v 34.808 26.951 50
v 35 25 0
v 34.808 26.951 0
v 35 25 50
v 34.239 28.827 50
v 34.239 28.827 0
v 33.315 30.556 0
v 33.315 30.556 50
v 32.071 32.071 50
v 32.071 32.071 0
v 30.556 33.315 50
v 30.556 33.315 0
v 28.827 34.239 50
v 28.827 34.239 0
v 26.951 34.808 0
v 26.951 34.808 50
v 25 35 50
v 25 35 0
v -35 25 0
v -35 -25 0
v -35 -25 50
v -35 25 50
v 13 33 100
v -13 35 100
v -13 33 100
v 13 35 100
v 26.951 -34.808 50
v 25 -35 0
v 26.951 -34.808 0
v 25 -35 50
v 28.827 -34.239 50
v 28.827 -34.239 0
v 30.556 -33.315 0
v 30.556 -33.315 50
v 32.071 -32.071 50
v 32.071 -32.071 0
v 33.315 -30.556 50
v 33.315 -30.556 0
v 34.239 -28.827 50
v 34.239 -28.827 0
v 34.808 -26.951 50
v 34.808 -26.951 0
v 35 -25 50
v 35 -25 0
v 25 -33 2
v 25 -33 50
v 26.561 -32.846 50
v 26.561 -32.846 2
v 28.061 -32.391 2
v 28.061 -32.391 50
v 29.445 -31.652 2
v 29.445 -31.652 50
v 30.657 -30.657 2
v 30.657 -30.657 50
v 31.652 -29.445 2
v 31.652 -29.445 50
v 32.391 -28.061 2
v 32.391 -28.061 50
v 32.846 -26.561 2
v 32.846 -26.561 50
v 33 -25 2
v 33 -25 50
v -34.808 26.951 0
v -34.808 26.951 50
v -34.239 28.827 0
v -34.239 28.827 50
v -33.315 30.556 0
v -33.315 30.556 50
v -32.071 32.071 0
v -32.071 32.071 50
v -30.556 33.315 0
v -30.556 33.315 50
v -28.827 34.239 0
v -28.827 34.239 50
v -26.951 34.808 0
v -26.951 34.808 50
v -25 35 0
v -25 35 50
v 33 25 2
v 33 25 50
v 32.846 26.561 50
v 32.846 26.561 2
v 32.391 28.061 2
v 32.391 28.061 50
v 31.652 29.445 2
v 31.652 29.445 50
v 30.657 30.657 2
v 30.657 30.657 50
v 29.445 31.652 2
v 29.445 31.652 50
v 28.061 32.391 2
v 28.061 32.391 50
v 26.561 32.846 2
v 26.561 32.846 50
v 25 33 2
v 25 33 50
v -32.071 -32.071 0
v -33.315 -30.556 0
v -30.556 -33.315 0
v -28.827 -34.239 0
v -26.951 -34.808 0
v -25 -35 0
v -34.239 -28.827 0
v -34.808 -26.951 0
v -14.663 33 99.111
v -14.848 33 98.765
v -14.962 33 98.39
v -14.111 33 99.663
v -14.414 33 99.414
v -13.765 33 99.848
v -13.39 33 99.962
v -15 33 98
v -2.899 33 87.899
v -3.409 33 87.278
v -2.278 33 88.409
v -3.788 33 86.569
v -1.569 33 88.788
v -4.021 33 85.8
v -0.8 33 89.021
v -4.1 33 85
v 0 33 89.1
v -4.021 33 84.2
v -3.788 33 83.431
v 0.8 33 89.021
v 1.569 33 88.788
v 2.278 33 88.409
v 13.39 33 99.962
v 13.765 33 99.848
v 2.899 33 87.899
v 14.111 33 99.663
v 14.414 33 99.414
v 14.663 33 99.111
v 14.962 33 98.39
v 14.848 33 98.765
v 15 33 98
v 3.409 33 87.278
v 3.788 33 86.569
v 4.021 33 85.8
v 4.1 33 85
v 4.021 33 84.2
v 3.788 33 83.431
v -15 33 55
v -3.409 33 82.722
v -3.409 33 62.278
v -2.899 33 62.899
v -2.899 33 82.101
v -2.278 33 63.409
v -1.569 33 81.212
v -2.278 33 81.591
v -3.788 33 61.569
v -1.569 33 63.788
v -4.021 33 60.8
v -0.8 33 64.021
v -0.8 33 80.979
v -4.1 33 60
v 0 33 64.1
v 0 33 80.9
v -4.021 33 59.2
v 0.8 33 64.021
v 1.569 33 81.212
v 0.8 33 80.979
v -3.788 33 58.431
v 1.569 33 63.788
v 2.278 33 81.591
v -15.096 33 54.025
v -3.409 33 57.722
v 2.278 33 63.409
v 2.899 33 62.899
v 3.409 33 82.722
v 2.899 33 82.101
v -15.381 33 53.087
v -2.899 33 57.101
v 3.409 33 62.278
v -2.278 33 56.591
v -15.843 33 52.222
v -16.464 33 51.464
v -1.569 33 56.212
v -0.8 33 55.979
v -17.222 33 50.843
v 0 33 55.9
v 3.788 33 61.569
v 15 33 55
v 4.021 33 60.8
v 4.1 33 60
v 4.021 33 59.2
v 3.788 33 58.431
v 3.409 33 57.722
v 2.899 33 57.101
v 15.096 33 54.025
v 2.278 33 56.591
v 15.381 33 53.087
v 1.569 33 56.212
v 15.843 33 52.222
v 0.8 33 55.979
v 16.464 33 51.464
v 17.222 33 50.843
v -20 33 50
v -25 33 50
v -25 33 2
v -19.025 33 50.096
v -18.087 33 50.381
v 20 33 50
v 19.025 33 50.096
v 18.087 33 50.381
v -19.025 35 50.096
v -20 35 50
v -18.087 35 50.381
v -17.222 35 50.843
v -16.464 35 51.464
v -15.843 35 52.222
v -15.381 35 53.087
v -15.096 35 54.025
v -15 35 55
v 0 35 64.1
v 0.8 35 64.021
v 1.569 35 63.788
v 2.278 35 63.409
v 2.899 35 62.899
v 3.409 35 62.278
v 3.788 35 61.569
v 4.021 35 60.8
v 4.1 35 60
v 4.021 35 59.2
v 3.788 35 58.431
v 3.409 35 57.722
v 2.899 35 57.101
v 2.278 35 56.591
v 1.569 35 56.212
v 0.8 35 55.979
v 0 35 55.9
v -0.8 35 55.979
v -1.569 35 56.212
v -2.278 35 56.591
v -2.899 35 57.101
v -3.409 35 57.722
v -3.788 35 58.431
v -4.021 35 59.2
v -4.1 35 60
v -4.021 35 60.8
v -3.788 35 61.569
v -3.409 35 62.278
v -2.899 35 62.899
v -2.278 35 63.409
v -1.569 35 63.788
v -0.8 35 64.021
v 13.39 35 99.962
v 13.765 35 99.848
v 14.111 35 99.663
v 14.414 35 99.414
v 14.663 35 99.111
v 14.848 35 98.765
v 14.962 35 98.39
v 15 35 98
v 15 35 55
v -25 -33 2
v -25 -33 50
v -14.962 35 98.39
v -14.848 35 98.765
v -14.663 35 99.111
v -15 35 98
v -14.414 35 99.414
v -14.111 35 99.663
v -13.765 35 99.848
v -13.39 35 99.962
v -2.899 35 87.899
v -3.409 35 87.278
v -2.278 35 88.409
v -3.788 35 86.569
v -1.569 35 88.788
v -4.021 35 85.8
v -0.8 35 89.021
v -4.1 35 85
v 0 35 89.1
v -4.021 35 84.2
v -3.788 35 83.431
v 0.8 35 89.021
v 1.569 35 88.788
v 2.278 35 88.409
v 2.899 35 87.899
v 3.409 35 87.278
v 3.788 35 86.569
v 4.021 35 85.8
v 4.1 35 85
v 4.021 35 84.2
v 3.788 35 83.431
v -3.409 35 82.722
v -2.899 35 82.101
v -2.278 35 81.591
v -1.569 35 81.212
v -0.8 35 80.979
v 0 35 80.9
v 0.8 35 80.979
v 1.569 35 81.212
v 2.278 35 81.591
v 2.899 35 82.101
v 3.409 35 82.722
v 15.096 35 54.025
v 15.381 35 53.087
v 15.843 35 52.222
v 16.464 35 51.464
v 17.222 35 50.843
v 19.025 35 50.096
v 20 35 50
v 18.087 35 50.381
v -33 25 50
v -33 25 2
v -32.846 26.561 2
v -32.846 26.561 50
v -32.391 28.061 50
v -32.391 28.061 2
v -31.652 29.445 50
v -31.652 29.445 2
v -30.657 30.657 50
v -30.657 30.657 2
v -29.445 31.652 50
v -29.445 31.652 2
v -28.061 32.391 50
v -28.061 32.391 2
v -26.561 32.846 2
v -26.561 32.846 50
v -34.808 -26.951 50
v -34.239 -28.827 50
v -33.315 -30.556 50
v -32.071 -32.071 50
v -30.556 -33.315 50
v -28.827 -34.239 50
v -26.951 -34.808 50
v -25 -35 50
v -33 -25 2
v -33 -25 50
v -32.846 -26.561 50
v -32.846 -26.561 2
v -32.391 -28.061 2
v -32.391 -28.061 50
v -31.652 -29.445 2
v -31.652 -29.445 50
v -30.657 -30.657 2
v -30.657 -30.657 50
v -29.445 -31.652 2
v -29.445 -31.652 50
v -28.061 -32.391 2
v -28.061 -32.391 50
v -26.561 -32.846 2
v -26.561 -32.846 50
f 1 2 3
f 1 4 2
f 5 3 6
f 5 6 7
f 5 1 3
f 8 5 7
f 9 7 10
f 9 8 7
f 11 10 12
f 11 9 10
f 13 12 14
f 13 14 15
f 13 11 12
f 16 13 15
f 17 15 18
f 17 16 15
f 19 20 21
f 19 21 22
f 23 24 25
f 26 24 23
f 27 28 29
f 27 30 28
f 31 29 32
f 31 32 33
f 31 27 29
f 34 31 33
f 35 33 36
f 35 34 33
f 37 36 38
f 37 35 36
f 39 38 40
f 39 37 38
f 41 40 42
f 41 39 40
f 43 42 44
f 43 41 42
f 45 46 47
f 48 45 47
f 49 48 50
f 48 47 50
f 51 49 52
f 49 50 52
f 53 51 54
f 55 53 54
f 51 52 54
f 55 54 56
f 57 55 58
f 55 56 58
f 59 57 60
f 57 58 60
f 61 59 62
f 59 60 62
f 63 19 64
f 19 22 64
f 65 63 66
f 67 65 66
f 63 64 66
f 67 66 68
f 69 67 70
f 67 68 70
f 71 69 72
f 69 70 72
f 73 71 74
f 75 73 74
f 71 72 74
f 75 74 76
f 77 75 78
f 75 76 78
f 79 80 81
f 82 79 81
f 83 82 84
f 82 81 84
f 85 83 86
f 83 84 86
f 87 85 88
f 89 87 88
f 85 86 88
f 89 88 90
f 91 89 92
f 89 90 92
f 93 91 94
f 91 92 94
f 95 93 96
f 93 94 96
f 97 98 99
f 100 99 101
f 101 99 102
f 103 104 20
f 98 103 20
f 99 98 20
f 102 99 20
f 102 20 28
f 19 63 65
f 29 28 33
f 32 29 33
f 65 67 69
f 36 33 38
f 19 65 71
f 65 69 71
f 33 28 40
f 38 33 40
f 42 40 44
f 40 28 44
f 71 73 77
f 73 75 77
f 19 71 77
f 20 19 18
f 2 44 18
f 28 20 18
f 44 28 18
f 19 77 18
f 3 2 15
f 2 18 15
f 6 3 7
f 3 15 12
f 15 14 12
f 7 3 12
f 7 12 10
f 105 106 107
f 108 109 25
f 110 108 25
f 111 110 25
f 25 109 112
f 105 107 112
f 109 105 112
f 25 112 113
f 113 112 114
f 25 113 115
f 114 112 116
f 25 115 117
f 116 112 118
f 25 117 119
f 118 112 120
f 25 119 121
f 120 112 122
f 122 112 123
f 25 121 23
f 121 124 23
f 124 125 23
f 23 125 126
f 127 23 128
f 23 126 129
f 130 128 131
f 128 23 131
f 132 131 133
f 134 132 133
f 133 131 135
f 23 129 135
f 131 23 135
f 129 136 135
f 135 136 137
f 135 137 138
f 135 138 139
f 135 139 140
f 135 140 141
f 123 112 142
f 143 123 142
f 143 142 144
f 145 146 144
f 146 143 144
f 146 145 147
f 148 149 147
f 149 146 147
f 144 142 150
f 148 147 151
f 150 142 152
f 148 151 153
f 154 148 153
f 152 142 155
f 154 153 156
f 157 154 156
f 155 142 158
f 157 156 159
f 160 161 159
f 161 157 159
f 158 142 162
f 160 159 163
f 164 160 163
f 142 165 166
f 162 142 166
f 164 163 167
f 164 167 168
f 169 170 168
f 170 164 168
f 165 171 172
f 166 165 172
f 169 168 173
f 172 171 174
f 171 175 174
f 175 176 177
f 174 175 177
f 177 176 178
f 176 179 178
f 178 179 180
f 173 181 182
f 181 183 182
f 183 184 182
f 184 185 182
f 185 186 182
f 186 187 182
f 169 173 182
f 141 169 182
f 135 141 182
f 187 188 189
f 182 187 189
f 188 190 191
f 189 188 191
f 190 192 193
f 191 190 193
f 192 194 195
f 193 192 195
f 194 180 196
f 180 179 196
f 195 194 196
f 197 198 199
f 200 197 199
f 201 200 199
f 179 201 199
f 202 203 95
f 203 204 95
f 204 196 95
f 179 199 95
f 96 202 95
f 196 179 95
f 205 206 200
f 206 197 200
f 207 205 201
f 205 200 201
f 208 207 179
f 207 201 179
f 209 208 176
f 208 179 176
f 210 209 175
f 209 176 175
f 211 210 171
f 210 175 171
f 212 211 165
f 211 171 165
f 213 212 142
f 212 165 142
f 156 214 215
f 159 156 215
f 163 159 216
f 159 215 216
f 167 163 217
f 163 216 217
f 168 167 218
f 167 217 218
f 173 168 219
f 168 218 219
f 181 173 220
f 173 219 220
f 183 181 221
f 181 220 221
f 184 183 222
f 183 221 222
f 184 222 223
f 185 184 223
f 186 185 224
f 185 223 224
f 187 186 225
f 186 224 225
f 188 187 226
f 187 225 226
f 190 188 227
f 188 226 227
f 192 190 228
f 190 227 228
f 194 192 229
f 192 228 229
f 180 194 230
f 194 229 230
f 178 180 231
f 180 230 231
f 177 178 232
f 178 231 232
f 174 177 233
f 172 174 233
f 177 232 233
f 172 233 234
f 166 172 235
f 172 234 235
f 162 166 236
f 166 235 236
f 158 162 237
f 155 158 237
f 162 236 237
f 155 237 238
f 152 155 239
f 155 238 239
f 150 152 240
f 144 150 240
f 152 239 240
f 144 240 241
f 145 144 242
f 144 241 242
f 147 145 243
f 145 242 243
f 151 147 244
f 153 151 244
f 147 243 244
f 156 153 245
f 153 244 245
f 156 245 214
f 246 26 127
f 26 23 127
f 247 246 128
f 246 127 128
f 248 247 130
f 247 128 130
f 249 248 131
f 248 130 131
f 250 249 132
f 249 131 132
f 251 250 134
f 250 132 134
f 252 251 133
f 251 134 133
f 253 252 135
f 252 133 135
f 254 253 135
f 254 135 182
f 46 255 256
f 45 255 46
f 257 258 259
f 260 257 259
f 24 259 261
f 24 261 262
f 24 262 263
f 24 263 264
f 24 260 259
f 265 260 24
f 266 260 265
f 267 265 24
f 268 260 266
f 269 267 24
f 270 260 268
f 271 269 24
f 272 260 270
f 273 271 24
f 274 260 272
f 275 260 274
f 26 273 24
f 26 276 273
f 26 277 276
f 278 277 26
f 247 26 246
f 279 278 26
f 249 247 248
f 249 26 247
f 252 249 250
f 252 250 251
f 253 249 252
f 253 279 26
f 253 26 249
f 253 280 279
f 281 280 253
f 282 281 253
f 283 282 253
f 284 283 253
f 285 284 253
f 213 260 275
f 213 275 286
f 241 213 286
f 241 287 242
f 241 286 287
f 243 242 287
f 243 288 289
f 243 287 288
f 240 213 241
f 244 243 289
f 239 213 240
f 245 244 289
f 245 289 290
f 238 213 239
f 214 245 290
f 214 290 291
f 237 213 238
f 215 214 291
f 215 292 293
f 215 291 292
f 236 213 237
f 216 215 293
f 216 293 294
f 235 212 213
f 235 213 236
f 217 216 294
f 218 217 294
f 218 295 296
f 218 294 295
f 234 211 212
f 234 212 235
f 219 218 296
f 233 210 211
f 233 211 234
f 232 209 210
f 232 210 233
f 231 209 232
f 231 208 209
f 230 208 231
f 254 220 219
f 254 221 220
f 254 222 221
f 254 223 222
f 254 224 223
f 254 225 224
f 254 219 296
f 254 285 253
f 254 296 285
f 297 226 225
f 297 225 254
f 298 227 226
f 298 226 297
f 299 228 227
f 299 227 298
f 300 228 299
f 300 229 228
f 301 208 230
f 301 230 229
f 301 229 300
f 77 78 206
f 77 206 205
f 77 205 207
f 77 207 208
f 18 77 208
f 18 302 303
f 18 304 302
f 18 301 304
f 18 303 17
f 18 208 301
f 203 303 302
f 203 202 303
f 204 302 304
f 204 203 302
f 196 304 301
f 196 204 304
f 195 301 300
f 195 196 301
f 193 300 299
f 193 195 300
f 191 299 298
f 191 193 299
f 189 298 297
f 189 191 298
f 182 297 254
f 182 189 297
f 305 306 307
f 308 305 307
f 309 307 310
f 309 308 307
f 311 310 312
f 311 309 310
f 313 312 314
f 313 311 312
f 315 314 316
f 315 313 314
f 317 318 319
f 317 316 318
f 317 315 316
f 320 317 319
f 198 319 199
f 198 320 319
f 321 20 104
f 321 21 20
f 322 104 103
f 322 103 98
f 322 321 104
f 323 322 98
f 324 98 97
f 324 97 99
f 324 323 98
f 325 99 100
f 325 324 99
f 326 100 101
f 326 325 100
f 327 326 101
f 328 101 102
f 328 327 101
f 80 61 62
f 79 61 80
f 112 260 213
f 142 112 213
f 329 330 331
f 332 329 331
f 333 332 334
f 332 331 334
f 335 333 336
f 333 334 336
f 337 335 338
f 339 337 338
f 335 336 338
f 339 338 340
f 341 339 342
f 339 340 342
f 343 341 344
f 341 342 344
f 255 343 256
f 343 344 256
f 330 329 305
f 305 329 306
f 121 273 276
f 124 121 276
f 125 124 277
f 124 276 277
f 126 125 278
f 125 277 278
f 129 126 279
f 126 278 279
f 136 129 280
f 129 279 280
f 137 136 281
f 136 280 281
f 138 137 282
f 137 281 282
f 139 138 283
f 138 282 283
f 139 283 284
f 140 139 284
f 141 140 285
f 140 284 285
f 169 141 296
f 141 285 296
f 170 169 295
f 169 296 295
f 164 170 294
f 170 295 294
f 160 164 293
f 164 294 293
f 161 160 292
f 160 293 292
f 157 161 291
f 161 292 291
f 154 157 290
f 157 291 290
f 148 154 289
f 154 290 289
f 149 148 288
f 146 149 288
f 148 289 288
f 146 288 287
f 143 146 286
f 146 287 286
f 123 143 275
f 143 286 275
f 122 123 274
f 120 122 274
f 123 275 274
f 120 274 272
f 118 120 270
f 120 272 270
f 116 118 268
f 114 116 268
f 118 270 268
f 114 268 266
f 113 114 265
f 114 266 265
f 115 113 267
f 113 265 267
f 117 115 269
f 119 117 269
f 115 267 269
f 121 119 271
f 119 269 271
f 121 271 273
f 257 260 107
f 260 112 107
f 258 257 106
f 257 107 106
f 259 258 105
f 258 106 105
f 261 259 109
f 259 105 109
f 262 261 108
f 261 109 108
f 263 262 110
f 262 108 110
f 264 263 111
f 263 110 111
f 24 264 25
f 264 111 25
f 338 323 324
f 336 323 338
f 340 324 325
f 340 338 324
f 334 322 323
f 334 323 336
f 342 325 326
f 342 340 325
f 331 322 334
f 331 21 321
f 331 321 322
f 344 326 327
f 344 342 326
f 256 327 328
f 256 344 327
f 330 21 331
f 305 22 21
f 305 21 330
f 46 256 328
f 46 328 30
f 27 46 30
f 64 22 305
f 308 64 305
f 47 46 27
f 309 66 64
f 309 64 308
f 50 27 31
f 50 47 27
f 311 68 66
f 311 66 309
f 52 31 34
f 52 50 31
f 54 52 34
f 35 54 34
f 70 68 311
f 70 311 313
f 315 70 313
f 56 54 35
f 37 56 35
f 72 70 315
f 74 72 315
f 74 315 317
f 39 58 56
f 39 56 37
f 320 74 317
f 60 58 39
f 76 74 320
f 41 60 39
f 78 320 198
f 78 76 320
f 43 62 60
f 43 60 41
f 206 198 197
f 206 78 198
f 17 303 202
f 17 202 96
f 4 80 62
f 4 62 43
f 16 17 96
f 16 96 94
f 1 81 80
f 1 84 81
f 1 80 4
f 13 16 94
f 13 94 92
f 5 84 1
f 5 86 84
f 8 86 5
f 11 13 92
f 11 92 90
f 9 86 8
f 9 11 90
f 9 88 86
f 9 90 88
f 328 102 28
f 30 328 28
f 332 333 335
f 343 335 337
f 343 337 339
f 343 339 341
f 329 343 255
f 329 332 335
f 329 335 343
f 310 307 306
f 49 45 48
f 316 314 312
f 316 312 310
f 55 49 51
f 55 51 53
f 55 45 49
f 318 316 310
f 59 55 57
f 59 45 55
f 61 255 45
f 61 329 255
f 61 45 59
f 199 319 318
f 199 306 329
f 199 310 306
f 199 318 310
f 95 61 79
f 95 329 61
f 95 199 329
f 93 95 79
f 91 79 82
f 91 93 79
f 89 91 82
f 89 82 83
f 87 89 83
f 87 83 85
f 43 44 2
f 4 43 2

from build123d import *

# Parameters (mm, degrees)
SKETCH1_W           = 70
SKETCH1_H           = 70
BOSS_EXTRUDE1_DEPTH = 50
FILLET1_R           = 10
SHELL1_T            = -2
SKETCH2_W           = 30
SKETCH2_H           = 50
SKETCH2_R           = 4.1
BOSS_EXTRUDE2_DEPTH = 2
FILLET2_R           = 5
FILLET3_R           = 2


with BuildPart() as part:
    # Sketch1 → Boss-Extrude1 (new body)
    with BuildSketch(Plane.XY):
        Rectangle(SKETCH1_W, SKETCH1_H)
    extrude(amount=BOSS_EXTRUDE1_DEPTH)

    # Fillet1
    fillet1_edges = [part.edges().sort_by_distance(p)[0] for p in [
        (35, -35, 25),
        (-35, -35, 25),
        (-35, 35, 25),
        (35, 35, 25),
    ]]
    fillet(fillet1_edges, radius=FILLET1_R)

    # Shell1
    shell1_openings = [part.faces().sort_by_distance(p)[0] for p in [
        (0, 0, 50),
    ]]
    offset(amount=SHELL1_T, openings=shell1_openings, kind=Kind.INTERSECTION)

    # Sketch2 → Boss-Extrude2 (add)
    with BuildSketch(Plane(origin=(0, 35, 0), x_dir=(1, 0, 0), z_dir=(0, 1, 0))):
        with Locations((0, -75)):
            Rectangle(SKETCH2_W, SKETCH2_H)
        with Locations(Location((0, -85, 0), (0, 0, 270))):
            Circle(SKETCH2_R, mode=Mode.SUBTRACT)
        with Locations(Location((0, -60, 0), (0, 0, 270))):
            Circle(SKETCH2_R, mode=Mode.SUBTRACT)
    extrude(amount=-BOSS_EXTRUDE2_DEPTH)

    # Fillet2
    fillet2_edges = [part.edges().sort_by_distance(p)[0] for p in [
        (15, 34, 50),
        (-15, 34, 50),
    ]]
    fillet(fillet2_edges, radius=FILLET2_R)

    # Fillet3
    fillet3_edges = [part.edges().sort_by_distance(p)[0] for p in [
        (-15, 34, 100),
        (15, 34, 100),
    ]]
    fillet(fillet3_edges, radius=FILLET3_R)


solid = part.part
